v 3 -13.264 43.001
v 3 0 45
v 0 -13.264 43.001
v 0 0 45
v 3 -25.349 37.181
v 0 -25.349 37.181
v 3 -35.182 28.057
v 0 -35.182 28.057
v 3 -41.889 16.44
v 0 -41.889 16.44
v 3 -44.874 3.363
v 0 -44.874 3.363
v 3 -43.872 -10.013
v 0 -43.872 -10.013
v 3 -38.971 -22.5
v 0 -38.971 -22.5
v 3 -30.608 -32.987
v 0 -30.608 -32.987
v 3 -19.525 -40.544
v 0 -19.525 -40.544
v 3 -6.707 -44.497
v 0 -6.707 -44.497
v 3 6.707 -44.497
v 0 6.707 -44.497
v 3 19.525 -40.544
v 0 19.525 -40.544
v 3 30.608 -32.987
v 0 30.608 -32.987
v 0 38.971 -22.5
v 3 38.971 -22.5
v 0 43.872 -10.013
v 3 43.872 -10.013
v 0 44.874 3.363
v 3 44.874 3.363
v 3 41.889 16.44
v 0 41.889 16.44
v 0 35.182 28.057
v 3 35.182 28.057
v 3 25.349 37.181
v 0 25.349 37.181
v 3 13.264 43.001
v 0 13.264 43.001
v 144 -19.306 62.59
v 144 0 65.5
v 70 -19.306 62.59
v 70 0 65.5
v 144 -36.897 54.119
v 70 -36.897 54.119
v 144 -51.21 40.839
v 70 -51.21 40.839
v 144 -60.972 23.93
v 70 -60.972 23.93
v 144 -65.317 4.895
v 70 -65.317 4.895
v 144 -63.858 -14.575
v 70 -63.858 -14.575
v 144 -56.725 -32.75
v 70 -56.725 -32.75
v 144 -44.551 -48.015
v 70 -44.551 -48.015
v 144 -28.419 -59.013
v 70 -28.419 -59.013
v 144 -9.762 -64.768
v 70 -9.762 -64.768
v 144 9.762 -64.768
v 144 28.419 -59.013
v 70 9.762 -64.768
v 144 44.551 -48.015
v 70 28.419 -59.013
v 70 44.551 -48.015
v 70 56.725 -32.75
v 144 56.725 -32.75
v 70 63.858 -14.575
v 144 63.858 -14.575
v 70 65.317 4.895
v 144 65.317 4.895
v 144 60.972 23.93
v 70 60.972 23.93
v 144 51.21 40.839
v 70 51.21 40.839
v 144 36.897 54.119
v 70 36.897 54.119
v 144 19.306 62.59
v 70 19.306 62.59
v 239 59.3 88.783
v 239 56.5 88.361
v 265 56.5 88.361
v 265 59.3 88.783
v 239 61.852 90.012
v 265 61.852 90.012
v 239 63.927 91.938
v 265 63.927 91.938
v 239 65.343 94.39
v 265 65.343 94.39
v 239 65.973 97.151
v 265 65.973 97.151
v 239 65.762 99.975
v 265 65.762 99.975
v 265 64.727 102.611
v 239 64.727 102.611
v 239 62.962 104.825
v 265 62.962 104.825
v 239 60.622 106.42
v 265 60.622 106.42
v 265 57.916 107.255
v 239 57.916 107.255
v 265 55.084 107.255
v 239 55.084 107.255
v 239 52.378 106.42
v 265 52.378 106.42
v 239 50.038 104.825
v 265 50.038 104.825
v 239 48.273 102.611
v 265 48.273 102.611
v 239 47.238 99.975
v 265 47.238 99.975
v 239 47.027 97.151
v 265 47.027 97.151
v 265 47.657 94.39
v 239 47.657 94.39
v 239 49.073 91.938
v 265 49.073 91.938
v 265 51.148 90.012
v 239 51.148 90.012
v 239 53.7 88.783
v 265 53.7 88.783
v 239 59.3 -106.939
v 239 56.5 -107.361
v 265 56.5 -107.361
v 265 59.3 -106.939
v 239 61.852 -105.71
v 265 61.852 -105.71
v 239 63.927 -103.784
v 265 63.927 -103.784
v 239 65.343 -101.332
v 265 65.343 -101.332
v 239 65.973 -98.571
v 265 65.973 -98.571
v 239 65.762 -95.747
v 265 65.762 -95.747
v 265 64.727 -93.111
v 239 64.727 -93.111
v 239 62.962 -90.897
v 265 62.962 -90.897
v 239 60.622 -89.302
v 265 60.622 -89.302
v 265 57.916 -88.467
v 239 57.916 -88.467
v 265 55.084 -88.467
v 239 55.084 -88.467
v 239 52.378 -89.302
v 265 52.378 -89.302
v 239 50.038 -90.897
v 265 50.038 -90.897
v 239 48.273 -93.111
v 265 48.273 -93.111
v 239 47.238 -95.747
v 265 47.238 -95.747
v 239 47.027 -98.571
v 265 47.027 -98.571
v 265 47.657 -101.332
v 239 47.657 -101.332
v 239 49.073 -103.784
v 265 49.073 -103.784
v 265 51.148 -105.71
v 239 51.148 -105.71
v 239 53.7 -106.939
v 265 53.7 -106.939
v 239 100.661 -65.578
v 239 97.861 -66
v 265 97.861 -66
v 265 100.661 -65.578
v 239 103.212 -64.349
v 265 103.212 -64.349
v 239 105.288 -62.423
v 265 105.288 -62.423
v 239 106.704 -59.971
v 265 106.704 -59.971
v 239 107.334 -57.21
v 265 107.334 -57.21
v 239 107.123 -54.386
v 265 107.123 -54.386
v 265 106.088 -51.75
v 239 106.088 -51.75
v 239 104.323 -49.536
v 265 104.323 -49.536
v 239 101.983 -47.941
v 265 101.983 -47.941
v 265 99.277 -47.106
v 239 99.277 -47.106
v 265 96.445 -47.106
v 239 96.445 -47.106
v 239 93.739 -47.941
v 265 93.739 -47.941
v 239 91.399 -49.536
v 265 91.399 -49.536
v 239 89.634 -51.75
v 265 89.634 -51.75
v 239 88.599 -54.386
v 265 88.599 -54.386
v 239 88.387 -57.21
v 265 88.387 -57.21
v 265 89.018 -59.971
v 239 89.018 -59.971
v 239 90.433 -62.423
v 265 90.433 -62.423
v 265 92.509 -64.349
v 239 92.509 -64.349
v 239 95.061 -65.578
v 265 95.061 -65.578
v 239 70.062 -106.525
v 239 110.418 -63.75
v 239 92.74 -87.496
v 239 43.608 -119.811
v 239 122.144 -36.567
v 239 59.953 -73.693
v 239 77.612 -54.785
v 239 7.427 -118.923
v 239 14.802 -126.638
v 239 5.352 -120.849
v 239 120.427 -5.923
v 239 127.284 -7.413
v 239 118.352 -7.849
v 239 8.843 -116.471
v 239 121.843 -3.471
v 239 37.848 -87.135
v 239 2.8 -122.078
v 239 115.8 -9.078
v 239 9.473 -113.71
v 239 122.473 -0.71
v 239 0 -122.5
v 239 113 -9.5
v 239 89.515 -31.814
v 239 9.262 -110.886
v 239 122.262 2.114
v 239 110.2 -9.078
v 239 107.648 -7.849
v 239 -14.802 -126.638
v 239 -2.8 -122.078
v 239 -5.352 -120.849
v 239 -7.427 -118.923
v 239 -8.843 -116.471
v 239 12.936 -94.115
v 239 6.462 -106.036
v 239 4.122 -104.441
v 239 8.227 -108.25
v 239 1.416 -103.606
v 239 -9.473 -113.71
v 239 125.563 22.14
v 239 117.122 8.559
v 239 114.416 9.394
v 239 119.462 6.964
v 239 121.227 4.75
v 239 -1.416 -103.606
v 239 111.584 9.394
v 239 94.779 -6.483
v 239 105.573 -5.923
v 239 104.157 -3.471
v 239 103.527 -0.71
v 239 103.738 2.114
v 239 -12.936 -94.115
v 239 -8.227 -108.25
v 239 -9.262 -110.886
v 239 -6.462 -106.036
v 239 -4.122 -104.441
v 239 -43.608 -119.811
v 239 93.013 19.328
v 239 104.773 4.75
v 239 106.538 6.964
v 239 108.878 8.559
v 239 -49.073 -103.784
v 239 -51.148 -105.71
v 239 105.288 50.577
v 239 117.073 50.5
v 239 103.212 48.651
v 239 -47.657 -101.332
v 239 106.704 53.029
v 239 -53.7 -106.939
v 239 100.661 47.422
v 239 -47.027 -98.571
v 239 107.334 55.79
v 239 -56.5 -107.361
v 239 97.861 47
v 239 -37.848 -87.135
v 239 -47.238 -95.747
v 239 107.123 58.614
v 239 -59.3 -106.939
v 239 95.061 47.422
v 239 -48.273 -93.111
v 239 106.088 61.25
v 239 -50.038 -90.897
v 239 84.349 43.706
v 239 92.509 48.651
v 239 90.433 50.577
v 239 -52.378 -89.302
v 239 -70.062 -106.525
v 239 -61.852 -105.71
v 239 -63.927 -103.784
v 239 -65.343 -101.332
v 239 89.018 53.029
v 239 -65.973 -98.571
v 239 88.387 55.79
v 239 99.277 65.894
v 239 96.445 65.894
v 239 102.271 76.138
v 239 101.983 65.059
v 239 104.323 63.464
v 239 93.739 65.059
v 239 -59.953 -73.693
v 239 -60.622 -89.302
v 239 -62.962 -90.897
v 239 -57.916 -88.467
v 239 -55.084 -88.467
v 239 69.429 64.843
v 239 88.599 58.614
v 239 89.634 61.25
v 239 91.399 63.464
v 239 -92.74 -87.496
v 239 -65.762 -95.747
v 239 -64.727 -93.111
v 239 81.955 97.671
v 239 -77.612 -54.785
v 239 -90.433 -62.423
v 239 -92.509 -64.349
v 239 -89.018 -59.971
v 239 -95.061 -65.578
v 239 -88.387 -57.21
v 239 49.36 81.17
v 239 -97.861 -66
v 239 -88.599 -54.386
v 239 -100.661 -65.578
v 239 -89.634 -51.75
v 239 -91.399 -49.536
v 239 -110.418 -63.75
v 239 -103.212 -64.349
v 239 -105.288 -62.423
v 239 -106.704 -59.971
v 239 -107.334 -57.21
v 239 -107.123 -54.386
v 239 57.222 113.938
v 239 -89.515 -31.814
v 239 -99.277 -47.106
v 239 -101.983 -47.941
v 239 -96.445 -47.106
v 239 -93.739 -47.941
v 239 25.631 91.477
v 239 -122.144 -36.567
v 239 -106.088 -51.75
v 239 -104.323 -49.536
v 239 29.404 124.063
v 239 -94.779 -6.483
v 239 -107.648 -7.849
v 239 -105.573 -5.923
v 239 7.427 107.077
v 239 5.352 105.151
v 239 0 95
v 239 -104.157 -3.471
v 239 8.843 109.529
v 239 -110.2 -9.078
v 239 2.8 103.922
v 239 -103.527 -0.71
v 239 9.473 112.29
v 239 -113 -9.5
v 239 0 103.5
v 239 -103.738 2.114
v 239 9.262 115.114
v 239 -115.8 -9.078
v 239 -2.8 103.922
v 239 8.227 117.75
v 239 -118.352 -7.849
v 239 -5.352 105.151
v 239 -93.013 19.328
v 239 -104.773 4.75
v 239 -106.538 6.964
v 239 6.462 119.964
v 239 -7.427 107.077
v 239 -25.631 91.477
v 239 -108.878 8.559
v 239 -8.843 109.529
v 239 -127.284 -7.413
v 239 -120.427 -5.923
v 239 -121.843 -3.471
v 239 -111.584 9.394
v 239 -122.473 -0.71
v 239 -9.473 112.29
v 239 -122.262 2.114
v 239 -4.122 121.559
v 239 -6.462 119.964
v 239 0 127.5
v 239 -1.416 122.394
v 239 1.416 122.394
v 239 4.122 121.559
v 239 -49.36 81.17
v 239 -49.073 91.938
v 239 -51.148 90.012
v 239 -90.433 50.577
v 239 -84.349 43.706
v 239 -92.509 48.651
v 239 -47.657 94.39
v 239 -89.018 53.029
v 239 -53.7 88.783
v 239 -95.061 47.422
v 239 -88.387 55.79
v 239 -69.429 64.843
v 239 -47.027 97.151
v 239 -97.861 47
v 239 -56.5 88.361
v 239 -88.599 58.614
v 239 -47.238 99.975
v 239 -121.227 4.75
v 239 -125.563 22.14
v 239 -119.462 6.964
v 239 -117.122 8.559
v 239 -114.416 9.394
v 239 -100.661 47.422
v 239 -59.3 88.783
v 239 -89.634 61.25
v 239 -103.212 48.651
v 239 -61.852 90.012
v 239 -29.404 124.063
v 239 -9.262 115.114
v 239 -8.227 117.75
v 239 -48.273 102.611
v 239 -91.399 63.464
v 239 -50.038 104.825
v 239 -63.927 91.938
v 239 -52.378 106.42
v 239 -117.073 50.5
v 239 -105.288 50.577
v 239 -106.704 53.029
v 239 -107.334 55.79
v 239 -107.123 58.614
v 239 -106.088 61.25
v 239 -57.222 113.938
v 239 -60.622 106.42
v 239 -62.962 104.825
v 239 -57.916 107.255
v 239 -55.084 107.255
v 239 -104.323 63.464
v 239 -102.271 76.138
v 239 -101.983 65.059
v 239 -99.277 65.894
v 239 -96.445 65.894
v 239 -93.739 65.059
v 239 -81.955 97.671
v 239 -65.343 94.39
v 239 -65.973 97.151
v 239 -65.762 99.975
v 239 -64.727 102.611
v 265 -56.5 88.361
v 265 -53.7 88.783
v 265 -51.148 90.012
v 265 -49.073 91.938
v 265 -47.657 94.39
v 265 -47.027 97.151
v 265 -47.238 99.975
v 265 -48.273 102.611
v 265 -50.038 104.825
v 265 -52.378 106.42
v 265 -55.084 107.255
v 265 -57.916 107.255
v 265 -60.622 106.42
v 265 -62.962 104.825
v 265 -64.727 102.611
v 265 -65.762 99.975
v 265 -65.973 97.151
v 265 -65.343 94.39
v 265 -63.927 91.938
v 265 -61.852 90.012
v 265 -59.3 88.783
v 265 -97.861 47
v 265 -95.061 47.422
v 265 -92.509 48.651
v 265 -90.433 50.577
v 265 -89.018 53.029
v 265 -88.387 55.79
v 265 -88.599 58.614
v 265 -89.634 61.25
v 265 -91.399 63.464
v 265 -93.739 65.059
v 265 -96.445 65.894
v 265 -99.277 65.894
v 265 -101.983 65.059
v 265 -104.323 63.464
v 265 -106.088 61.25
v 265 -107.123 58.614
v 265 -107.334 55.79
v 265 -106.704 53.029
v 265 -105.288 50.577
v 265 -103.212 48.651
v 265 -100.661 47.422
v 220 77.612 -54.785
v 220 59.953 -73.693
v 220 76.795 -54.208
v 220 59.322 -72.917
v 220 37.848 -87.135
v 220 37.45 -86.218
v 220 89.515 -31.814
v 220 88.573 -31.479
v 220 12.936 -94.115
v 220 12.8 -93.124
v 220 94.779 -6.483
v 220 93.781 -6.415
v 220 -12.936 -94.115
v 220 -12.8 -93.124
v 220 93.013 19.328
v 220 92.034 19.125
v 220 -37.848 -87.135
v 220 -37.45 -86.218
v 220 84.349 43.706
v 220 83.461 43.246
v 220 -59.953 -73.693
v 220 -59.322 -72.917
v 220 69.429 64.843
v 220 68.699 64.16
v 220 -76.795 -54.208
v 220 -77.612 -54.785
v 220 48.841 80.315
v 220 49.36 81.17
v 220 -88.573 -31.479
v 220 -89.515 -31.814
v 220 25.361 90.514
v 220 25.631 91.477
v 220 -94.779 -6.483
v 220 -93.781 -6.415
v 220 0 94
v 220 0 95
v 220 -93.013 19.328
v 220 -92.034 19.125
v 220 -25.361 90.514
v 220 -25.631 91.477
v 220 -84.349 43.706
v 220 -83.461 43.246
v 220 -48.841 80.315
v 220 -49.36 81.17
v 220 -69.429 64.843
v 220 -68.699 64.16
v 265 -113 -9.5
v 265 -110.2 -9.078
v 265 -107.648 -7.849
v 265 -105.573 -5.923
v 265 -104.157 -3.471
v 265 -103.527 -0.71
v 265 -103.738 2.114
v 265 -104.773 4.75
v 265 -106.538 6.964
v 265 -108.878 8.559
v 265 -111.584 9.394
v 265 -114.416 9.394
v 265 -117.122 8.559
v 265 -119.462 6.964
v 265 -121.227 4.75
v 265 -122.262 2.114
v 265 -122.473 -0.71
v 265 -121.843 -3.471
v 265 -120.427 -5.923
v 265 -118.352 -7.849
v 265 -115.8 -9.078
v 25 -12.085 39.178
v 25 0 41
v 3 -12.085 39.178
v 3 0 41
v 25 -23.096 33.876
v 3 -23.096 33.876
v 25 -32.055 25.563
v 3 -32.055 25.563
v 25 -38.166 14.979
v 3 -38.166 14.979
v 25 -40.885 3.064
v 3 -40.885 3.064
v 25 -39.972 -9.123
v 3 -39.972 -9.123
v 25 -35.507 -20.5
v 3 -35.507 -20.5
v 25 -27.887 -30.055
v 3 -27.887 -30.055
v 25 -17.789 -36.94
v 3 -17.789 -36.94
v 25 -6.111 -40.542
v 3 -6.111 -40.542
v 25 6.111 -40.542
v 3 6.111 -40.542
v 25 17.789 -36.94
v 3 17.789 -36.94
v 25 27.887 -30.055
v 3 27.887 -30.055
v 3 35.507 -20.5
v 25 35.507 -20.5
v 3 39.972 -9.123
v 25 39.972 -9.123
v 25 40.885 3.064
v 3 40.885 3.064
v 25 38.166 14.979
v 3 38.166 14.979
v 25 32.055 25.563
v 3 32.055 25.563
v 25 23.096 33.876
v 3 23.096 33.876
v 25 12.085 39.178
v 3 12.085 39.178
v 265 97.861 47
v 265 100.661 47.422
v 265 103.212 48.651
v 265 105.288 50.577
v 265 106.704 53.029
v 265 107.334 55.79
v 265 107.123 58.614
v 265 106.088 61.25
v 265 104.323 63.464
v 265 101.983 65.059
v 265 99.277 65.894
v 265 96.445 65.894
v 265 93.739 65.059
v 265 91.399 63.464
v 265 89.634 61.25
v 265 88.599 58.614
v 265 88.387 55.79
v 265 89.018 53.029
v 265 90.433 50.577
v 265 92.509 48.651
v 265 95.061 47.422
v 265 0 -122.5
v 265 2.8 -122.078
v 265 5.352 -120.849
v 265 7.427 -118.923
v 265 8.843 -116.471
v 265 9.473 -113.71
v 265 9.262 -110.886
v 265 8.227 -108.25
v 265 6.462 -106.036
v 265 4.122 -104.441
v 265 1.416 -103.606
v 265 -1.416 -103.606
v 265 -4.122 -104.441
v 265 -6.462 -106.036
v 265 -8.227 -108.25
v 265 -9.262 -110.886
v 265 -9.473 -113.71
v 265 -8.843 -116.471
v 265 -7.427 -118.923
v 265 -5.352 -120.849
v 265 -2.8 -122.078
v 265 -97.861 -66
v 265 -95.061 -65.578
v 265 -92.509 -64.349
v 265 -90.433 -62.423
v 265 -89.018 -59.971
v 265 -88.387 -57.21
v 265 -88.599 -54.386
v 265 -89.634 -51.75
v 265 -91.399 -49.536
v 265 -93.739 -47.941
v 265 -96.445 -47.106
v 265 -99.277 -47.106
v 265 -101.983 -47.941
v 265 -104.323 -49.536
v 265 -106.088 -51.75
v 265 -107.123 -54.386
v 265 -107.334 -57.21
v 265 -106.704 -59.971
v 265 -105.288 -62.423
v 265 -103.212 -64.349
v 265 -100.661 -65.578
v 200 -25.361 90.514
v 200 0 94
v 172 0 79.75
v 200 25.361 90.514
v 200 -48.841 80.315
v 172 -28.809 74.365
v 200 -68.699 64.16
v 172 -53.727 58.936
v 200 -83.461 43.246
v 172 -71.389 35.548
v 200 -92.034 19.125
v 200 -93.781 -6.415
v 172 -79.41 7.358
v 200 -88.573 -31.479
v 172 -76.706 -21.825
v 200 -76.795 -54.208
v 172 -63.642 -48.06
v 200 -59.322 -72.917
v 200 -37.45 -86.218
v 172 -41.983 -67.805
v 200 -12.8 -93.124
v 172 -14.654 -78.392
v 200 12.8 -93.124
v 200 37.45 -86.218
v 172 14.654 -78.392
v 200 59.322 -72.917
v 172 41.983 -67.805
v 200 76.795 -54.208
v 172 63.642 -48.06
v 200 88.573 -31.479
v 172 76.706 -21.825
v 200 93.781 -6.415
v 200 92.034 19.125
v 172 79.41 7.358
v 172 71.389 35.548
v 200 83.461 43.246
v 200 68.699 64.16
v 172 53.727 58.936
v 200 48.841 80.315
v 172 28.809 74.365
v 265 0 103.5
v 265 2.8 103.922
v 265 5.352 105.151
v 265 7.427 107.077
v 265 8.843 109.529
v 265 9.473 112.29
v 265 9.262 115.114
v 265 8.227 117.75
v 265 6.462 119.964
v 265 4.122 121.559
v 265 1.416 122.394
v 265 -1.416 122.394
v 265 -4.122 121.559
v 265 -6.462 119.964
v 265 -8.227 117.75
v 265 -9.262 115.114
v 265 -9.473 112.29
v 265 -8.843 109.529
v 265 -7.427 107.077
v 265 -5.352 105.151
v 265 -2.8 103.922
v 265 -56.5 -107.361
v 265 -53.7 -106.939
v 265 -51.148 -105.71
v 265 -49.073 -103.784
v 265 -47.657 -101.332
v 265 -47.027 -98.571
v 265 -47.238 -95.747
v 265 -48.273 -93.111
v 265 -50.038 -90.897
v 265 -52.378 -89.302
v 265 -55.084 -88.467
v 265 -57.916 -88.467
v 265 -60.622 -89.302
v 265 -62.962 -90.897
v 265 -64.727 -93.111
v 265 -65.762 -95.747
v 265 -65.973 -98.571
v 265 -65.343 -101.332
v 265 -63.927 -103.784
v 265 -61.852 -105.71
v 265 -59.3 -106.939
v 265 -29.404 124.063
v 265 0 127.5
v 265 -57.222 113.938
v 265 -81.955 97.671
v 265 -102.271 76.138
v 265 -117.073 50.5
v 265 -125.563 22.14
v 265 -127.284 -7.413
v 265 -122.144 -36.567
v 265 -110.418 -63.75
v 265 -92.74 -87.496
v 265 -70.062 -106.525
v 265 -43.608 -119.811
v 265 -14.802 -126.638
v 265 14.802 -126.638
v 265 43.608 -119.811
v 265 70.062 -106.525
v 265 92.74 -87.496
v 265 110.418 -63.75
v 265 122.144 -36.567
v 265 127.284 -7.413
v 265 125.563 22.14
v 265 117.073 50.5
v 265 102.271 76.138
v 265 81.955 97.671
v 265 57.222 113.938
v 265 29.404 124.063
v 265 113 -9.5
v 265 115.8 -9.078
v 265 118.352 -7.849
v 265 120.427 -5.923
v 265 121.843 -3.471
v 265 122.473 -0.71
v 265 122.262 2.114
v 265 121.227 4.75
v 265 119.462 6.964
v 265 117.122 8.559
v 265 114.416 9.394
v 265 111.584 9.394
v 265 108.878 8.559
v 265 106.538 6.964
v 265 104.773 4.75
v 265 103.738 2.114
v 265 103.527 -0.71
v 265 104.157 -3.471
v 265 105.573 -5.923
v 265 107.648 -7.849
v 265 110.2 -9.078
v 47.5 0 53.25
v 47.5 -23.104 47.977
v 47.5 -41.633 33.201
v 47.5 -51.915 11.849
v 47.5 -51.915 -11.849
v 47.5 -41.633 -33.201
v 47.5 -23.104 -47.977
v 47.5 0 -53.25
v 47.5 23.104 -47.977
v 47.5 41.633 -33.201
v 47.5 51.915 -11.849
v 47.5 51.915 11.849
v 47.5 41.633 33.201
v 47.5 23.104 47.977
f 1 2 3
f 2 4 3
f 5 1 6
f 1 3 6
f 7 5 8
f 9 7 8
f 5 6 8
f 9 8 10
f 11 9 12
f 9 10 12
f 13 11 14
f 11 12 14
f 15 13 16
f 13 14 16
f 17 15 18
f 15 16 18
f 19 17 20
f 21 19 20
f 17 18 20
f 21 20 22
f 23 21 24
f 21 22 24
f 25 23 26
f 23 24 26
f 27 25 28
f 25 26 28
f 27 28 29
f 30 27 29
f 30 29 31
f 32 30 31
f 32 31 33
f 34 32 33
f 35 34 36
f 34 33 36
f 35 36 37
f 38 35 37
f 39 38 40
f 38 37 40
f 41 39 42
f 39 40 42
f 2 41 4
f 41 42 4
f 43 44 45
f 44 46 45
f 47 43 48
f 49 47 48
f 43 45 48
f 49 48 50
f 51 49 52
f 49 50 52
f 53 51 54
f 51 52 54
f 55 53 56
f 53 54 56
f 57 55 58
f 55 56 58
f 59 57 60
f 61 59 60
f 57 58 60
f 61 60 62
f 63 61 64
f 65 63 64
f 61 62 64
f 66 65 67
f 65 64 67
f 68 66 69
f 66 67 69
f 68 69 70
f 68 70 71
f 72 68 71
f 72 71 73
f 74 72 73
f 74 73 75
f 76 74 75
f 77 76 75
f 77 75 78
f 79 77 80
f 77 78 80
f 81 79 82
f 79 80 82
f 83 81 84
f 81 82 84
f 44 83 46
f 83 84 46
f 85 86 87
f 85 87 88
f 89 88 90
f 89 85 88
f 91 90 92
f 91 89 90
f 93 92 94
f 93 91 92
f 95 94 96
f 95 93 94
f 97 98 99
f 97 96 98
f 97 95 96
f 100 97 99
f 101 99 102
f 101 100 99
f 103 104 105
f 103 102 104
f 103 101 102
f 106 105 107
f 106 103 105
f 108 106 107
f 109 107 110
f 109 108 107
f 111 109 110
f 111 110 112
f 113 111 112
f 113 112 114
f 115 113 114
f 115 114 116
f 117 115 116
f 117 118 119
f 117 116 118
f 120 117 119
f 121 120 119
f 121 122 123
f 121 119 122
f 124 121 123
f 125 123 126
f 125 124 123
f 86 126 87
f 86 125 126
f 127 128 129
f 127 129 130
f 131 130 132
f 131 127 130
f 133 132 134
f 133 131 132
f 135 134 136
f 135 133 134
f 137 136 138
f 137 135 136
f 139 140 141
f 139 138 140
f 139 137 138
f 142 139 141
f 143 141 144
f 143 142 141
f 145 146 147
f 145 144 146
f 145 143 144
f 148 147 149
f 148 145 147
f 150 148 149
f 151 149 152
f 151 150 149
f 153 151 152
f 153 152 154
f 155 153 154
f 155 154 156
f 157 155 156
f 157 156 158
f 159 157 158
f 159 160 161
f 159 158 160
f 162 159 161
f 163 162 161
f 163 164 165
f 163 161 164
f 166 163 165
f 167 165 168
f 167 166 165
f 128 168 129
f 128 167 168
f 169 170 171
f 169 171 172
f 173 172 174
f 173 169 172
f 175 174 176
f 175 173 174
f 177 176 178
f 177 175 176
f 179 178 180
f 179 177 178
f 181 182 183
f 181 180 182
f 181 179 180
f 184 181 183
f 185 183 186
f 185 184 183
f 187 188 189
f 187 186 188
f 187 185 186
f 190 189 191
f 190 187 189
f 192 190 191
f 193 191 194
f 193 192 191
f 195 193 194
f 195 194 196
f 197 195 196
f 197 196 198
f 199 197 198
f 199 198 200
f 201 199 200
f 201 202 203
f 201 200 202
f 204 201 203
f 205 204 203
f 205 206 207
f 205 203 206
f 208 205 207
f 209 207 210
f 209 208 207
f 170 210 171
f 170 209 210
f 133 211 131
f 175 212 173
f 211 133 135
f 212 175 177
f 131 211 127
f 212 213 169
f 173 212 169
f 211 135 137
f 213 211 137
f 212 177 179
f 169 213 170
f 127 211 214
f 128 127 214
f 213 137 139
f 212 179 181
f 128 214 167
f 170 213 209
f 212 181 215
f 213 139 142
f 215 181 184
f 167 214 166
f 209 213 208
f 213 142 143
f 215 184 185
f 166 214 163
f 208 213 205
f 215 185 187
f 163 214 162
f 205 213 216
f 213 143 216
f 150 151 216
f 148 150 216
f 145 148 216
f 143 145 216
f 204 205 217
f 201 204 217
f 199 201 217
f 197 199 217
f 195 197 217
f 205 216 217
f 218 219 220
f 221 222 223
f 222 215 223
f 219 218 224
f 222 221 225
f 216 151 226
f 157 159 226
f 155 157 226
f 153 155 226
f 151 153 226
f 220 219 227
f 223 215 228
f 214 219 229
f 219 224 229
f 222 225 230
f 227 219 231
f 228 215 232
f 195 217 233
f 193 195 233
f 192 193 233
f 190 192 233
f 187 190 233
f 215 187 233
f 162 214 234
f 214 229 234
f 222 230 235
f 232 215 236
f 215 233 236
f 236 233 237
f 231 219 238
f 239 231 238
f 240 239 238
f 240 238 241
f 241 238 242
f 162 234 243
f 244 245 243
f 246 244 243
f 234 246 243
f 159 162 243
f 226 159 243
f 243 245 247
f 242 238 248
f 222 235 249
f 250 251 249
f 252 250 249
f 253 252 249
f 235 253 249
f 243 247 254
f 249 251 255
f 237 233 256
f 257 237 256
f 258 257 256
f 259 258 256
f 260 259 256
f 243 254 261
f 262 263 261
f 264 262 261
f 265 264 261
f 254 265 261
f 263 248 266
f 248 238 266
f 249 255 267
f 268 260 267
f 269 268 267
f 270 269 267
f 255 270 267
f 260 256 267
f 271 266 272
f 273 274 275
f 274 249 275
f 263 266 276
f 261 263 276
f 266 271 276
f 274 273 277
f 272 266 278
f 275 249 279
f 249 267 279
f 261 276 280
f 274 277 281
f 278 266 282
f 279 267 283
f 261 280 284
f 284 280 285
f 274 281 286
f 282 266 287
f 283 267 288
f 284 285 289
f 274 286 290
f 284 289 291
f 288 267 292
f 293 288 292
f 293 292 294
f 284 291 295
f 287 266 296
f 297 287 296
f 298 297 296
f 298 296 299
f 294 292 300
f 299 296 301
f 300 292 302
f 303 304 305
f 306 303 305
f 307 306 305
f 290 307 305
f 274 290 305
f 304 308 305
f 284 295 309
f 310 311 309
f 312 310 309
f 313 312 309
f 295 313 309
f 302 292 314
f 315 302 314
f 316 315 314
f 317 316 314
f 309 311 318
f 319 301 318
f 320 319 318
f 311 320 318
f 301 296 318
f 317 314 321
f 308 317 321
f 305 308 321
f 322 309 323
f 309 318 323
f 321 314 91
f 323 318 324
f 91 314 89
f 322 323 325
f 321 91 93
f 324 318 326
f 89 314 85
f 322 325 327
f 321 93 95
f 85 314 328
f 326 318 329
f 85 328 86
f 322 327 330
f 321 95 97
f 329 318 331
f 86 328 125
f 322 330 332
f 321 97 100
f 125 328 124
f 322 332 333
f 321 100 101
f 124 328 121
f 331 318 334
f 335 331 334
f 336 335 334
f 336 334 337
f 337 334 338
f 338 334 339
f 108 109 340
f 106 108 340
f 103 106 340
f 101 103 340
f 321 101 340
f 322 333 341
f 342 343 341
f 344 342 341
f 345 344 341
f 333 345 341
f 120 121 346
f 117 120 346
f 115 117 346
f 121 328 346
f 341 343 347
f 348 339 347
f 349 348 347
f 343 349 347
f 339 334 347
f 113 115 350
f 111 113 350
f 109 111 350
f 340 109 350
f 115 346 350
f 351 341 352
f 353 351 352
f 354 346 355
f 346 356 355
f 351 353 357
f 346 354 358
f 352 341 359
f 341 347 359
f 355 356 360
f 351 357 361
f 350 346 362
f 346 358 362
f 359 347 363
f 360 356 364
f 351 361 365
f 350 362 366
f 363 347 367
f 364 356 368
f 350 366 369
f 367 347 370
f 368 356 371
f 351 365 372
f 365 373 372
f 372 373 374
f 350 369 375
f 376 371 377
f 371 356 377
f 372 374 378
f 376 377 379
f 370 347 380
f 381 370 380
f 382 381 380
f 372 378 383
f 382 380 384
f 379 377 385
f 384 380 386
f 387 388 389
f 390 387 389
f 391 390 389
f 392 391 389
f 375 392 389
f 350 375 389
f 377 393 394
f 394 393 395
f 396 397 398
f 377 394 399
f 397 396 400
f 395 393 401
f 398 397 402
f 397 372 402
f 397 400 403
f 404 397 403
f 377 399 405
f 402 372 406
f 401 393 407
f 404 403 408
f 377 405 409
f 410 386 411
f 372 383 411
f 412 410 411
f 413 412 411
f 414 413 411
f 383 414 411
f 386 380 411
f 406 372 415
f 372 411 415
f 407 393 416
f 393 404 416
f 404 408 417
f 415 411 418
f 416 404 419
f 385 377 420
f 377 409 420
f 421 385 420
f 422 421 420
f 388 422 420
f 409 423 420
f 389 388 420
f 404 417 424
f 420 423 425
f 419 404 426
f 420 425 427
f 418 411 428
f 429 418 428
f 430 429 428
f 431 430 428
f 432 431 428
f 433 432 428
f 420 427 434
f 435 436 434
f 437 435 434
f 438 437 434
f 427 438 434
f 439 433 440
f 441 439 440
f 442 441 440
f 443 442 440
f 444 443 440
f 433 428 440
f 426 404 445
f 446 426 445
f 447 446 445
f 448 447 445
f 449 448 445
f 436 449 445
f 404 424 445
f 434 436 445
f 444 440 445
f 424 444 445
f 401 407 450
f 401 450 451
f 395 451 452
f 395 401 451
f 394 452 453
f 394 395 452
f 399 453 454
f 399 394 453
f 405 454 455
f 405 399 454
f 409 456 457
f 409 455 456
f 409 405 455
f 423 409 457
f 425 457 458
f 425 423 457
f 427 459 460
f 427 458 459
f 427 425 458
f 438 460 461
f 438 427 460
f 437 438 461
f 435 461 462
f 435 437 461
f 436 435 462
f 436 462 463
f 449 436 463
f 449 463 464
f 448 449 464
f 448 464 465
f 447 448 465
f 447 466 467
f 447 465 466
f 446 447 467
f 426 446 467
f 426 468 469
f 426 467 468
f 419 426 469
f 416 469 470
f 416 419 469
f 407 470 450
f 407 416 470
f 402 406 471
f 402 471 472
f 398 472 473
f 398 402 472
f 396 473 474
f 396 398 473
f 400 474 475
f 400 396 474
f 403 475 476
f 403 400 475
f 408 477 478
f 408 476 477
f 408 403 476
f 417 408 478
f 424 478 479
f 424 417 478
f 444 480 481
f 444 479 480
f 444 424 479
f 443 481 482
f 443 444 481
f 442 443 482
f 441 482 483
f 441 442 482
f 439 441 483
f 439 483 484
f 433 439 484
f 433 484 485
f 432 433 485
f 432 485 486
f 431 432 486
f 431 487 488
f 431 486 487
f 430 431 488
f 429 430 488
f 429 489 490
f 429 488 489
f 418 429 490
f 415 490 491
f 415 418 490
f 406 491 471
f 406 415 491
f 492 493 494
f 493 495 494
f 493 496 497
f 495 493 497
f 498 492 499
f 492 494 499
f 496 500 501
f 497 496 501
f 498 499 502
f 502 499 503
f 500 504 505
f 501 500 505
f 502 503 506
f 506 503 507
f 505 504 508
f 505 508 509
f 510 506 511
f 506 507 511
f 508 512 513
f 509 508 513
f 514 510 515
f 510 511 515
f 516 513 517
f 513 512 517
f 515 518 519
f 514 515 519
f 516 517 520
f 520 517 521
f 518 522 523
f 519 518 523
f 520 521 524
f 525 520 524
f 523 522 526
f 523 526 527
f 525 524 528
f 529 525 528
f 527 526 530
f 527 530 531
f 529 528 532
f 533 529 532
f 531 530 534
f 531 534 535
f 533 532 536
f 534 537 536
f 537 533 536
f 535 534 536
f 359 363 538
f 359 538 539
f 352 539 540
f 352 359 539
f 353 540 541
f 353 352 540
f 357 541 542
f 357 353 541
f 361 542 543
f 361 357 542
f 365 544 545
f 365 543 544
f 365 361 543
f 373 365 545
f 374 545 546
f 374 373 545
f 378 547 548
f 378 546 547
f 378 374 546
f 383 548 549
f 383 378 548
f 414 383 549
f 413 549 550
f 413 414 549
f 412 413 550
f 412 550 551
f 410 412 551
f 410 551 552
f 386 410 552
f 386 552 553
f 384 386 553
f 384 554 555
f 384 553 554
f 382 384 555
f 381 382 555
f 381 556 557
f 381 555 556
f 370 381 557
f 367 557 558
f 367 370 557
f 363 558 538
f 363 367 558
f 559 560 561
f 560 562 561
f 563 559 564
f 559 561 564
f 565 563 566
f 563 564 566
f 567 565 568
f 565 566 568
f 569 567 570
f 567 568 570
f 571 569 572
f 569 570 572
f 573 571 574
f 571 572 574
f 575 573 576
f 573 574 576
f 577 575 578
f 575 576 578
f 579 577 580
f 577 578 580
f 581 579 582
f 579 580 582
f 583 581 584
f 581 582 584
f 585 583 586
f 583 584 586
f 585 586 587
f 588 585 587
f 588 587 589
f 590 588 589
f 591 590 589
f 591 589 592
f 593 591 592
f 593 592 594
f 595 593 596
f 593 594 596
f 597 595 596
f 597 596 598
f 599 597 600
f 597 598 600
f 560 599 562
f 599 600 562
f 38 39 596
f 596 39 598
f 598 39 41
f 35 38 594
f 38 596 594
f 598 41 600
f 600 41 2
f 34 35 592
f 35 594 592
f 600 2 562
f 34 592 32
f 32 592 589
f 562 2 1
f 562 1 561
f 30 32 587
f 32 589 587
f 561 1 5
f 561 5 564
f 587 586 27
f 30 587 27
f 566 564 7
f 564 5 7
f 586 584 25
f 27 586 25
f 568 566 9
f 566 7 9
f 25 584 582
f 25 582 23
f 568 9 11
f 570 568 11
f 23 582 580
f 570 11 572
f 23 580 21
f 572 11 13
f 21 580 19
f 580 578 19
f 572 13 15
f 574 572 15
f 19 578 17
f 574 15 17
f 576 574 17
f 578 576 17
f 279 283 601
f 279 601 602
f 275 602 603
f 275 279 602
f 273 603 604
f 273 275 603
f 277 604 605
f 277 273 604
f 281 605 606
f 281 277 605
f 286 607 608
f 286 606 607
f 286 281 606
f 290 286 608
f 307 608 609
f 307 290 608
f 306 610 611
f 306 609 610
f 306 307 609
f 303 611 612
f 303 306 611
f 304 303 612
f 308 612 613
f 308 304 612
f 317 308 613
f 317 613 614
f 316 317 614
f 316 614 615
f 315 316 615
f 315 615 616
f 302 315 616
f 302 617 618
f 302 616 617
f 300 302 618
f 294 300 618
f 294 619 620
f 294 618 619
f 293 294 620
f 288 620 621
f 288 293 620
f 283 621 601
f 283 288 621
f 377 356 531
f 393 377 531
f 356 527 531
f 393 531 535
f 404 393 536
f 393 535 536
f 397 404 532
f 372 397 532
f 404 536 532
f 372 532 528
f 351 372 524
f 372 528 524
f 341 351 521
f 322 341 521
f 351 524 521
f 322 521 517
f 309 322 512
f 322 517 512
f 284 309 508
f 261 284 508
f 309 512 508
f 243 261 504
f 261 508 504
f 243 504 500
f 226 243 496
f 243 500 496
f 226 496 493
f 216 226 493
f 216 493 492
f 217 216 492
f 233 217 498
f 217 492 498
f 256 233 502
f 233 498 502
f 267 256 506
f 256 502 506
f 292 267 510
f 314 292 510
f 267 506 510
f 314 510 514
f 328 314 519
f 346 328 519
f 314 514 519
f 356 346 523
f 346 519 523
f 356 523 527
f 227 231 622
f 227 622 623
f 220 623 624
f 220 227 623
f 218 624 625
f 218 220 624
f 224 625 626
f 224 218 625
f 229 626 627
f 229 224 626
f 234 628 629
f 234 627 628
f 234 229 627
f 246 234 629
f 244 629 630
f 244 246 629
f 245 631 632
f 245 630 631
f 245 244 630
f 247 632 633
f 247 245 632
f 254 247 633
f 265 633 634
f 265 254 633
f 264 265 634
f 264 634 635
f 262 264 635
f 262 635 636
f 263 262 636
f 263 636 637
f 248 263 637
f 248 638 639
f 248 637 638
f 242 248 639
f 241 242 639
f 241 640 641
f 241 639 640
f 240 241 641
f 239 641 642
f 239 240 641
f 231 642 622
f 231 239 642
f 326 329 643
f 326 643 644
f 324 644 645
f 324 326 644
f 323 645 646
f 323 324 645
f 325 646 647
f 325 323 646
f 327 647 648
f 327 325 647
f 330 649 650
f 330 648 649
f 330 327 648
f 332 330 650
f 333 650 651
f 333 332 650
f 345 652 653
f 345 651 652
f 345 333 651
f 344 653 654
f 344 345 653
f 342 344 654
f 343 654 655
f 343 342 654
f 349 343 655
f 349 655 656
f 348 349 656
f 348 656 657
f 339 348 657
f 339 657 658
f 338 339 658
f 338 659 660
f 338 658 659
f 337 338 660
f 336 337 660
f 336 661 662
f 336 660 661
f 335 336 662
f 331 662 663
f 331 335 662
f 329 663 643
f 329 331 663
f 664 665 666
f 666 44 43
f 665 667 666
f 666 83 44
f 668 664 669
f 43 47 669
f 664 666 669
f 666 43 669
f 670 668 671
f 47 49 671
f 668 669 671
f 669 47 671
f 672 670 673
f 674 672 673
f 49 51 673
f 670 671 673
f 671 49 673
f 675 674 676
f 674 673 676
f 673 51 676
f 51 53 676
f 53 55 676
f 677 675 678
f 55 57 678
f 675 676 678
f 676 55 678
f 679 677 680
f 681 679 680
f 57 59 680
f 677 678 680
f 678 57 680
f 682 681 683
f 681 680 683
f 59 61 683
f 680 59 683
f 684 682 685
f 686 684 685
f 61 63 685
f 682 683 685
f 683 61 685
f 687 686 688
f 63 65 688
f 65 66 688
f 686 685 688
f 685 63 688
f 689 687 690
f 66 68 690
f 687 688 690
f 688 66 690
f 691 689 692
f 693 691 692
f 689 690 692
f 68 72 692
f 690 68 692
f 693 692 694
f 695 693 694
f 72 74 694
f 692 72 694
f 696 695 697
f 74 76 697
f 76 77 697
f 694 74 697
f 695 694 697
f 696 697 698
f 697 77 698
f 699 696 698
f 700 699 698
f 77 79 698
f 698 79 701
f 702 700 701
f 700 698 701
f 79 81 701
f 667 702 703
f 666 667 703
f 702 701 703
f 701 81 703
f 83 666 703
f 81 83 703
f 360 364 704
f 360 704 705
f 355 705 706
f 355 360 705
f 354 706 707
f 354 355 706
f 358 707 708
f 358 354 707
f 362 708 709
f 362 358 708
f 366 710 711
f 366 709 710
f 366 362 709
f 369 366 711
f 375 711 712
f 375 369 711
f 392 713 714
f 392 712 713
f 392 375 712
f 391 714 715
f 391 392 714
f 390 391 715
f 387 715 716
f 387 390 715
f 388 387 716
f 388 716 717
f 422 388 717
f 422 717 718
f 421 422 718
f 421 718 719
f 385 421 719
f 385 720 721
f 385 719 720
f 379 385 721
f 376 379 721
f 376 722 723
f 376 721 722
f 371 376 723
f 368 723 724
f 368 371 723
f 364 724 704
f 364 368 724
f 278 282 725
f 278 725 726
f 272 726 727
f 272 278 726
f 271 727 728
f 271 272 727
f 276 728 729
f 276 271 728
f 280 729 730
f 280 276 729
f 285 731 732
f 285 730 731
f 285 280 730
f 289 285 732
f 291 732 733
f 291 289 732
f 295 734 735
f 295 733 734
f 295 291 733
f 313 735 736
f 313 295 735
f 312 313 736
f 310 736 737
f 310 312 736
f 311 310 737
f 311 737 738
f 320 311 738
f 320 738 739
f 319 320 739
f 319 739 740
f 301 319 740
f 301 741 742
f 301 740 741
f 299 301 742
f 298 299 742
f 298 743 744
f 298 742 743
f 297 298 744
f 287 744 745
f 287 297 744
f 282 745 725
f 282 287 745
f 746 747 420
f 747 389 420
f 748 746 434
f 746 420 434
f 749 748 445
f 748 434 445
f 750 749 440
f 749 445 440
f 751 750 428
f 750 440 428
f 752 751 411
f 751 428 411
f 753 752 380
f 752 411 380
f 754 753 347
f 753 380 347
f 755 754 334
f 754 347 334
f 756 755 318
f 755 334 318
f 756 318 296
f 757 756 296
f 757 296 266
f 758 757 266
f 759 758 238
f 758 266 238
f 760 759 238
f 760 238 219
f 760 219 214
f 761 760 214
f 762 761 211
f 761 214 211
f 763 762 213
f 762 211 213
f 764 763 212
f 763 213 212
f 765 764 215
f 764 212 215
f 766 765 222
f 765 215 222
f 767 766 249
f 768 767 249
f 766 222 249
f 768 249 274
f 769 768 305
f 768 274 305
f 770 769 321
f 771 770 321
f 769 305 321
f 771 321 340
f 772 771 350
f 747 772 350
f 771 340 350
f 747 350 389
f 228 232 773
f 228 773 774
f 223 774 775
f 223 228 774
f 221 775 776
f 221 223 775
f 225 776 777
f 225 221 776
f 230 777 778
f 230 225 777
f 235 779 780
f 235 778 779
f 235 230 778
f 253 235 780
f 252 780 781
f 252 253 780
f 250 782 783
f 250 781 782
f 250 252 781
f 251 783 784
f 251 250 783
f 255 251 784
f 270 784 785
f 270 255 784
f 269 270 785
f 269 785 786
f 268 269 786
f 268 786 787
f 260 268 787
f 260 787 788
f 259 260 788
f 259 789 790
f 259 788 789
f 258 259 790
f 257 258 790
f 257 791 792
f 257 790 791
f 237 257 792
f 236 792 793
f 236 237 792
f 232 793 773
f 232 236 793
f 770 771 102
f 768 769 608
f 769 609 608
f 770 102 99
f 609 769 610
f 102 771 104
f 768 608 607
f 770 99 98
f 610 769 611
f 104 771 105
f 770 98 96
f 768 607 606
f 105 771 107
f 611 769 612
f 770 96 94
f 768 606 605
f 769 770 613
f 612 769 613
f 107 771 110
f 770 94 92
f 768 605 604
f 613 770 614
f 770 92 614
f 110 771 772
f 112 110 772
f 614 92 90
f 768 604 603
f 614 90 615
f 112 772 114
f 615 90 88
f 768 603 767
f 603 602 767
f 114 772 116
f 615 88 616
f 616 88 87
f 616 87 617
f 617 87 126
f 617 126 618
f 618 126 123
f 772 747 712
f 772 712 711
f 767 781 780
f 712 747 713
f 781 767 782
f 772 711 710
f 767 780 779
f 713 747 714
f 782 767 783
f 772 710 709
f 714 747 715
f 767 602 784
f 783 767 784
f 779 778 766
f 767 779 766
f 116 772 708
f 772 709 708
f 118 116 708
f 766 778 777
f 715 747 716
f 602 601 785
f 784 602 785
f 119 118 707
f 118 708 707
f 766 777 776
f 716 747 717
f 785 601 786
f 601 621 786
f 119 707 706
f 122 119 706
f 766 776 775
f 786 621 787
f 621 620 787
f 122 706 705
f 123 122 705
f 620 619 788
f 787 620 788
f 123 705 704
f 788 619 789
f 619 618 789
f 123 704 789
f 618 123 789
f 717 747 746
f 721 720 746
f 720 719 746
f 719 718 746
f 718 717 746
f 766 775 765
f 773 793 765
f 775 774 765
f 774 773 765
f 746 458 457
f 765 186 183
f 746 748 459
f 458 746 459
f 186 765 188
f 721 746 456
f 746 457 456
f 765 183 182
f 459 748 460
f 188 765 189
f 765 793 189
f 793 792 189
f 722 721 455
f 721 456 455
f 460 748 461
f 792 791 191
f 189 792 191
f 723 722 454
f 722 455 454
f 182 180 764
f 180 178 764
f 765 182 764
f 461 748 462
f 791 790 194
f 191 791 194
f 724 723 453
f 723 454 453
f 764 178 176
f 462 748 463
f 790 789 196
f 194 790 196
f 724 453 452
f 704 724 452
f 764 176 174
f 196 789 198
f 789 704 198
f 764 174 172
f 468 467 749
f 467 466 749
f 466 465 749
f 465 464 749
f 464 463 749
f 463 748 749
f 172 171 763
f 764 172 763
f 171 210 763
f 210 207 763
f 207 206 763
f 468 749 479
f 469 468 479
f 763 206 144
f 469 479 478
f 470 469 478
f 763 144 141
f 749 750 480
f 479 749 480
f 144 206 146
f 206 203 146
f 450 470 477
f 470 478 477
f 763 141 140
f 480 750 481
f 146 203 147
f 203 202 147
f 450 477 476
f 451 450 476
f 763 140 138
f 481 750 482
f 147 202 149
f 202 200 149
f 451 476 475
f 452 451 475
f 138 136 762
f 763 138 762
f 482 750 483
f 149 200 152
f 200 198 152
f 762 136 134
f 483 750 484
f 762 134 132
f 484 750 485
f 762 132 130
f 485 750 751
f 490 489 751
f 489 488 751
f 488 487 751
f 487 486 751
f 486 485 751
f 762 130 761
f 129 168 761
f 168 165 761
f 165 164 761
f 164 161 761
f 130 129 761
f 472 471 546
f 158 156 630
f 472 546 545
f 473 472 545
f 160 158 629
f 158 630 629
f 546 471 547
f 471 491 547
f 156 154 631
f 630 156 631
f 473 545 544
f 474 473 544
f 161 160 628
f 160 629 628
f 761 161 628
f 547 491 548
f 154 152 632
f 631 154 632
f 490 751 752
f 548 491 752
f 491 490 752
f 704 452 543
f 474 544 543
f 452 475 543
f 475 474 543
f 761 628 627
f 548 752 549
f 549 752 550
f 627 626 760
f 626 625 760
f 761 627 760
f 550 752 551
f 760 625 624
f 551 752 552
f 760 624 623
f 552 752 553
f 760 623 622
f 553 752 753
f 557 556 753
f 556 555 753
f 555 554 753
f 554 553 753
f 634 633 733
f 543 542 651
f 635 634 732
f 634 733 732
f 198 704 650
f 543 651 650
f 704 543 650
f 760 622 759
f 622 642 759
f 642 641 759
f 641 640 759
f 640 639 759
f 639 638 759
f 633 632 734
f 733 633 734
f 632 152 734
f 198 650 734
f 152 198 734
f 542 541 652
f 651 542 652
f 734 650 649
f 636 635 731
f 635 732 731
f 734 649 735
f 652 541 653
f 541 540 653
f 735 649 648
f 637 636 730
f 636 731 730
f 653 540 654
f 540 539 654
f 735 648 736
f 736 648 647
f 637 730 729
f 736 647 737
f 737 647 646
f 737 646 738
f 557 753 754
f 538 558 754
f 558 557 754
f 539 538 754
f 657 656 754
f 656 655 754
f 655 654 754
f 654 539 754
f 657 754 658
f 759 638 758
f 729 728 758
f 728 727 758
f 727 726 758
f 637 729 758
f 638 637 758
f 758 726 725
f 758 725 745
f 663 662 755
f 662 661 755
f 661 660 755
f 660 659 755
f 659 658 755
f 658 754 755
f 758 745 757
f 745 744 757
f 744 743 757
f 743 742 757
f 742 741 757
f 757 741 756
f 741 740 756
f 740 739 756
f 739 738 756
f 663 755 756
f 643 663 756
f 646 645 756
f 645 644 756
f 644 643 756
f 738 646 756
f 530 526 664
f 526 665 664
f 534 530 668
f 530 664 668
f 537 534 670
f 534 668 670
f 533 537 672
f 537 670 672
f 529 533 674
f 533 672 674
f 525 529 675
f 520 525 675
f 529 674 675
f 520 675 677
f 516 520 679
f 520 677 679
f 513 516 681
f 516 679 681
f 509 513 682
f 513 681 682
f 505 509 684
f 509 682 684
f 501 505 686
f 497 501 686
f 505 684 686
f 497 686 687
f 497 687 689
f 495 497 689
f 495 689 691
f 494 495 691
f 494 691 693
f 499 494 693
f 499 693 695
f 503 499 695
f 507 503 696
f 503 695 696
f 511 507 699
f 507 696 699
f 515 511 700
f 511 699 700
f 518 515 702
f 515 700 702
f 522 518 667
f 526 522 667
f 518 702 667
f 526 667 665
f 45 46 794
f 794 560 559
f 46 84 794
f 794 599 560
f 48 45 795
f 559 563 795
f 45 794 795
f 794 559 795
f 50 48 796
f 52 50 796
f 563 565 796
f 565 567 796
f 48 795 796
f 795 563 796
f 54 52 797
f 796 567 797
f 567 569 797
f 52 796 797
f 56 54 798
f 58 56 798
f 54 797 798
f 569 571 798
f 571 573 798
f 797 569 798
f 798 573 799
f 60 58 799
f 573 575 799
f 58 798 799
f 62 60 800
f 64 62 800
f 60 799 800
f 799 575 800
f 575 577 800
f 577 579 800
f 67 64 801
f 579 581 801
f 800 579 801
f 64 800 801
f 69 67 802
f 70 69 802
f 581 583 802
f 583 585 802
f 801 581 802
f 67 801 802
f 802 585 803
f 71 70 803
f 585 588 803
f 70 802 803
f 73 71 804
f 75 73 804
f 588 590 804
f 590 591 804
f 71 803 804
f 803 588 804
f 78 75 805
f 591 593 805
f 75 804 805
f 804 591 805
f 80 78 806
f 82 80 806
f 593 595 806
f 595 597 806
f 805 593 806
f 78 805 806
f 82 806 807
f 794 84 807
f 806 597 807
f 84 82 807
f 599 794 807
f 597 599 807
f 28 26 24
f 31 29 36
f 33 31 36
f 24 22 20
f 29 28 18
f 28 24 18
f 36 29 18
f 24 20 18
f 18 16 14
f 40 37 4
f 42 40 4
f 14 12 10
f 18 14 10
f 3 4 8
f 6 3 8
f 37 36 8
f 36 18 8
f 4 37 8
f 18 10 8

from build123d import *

# Parameters (mm, degrees)
SKETCH_2_R           = 9.5
CUT_EXTRUDE_1_DEPTH  = 321.526909947
SKETCH_3_R           = 9.5
CUT_EXTRUDE_2_DEPTH  = 321.526909947
SKETCH_4_R           = 9.5
CUT_EXTRUDE_3_DEPTH  = 321.526909947
SKETCH_5_R           = 9.5
CUT_EXTRUDE_4_DEPTH  = 321.526909947
SKETCH_6_R           = 9.5
CUT_EXTRUDE_5_DEPTH  = 321.526909947
SKETCH_7_R           = 9.5
CUT_EXTRUDE_6_DEPTH  = 321.526909947
SKETCH_8_R           = 9.5
CUT_EXTRUDE_7_DEPTH  = 321.526909947
SKETCH_9_R           = 9.5
CUT_EXTRUDE_8_DEPTH  = 321.526909947
SKETCH_10_R          = 9.5
CUT_EXTRUDE_9_DEPTH  = 321.526909947
SKETCH_11_R          = 9.5
CUT_EXTRUDE_10_DEPTH = 321.526909947
SKETCH_12_R          = 9.5
CUT_EXTRUDE_11_DEPTH = 321.526909947
SKETCH_13_R          = 9.5
CUT_EXTRUDE_12_DEPTH = 321.526909947


with BuildPart() as part:
    # Эскиз1 → Повернуть1 (revolve)
    with BuildSketch(Plane.XY, mode=Mode.PRIVATE) as revolve_1_sk:
        Polygon((0, 0), (265, 0), (265, 127.5), (239, 127.5), (239, 100), (239, 95), (220, 95), (220, 94), (200, 94), (144, 65.5), (70, 65.5), (25, 41), (3, 41), (3, 45), (0, 45), align=None)
    revolve(revolve_1_sk.sketch.rotate(Axis((0, 0, 0), (1, 0, 0)), 90), axis=Axis((0, 0, 0), (1, 0, 0)))

    # Эскиз2 → Вырез-Вытянуть1 (cut, through all)
    with BuildSketch(Plane(origin=(0, 0, 0), x_dir=(0, 0, -1), z_dir=(1, 0, 0))):
        with Locations((0, 113)):
            Circle(SKETCH_2_R)
    extrude(amount=CUT_EXTRUDE_1_DEPTH, mode=Mode.SUBTRACT)

    # Эскиз3 → Вырез-Вытянуть2 (cut, through all)
    with BuildSketch(Plane(origin=(0, 0, 0), x_dir=(0, 0, -1), z_dir=(1, 0, 0))):
        with Locations((-56.5, 97.860870628)):
            Circle(SKETCH_3_R)
    extrude(amount=CUT_EXTRUDE_2_DEPTH, mode=Mode.SUBTRACT)

    # Эскиз4 → Вырез-Вытянуть3 (cut, through all)
    with BuildSketch(Plane(origin=(0, 0, 0), x_dir=(0, 0, -1), z_dir=(1, 0, 0))):
        with Locations((-97.860870628, 56.5)):
            Circle(SKETCH_4_R)
    extrude(amount=CUT_EXTRUDE_3_DEPTH, mode=Mode.SUBTRACT)

    # Эскиз5 → Вырез-Вытянуть4 (cut, through all)
    with BuildSketch(Plane(origin=(0, 0, 0), x_dir=(0, 0, -1), z_dir=(1, 0, 0))):
        with Locations((-113, 0)):
            Circle(SKETCH_5_R)
    extrude(amount=CUT_EXTRUDE_4_DEPTH, mode=Mode.SUBTRACT)

    # Эскиз6 → Вырез-Вытянуть5 (cut, through all)
    with BuildSketch(Plane(origin=(0, 0, 0), x_dir=(0, 0, -1), z_dir=(1, 0, 0))):
        with Locations((-97.860870628, -56.5)):
            Circle(SKETCH_6_R)
    extrude(amount=CUT_EXTRUDE_5_DEPTH, mode=Mode.SUBTRACT)

    # Эскиз7 → Вырез-Вытянуть6 (cut, through all)
    with BuildSketch(Plane(origin=(0, 0, 0), x_dir=(0, 0, -1), z_dir=(1, 0, 0))):
        with Locations((-56.5, -97.860870628)):
            Circle(SKETCH_7_R)
    extrude(amount=CUT_EXTRUDE_6_DEPTH, mode=Mode.SUBTRACT)

    # Эскиз8 → Вырез-Вытянуть7 (cut, through all)
    with BuildSketch(Plane(origin=(0, 0, 0), x_dir=(0, 0, -1), z_dir=(1, 0, 0))):
        with Locations((0, -113)):
            Circle(SKETCH_8_R)
    extrude(amount=CUT_EXTRUDE_7_DEPTH, mode=Mode.SUBTRACT)

    # Эскиз9 → Вырез-Вытянуть8 (cut, through all)
    with BuildSketch(Plane(origin=(0, 0, 0), x_dir=(0, 0, -1), z_dir=(1, 0, 0))):
        with Locations((56.5, -97.860870628)):
            Circle(SKETCH_9_R)
    extrude(amount=CUT_EXTRUDE_8_DEPTH, mode=Mode.SUBTRACT)

    # Эскиз10 → Вырез-Вытянуть9 (cut, through all)
    with BuildSketch(Plane(origin=(0, 0, 0), x_dir=(0, 0, -1), z_dir=(1, 0, 0))):
        with Locations((97.860870628, -56.5)):
            Circle(SKETCH_10_R)
    extrude(amount=CUT_EXTRUDE_9_DEPTH, mode=Mode.SUBTRACT)

    # Эскиз11 → Вырез-Вытянуть10 (cut, through all)
    with BuildSketch(Plane(origin=(0, 0, 0), x_dir=(0, 0, -1), z_dir=(1, 0, 0))):
        with Locations((113, 0)):
            Circle(SKETCH_11_R)
    extrude(amount=CUT_EXTRUDE_10_DEPTH, mode=Mode.SUBTRACT)

    # Эскиз12 → Вырез-Вытянуть11 (cut, through all)
    with BuildSketch(Plane(origin=(0, 0, 0), x_dir=(0, 0, -1), z_dir=(1, 0, 0))):
        with Locations((97.860870628, 56.5)):
            Circle(SKETCH_12_R)
    extrude(amount=CUT_EXTRUDE_11_DEPTH, mode=Mode.SUBTRACT)

    # Эскиз13 → Вырез-Вытянуть12 (cut, through all)
    with BuildSketch(Plane(origin=(0, 0, 0), x_dir=(0, 0, -1), z_dir=(1, 0, 0))):
        with Locations((56.5, 97.860870628)):
            Circle(SKETCH_13_R)
    extrude(amount=CUT_EXTRUDE_12_DEPTH, mode=Mode.SUBTRACT)


solid = part.part
